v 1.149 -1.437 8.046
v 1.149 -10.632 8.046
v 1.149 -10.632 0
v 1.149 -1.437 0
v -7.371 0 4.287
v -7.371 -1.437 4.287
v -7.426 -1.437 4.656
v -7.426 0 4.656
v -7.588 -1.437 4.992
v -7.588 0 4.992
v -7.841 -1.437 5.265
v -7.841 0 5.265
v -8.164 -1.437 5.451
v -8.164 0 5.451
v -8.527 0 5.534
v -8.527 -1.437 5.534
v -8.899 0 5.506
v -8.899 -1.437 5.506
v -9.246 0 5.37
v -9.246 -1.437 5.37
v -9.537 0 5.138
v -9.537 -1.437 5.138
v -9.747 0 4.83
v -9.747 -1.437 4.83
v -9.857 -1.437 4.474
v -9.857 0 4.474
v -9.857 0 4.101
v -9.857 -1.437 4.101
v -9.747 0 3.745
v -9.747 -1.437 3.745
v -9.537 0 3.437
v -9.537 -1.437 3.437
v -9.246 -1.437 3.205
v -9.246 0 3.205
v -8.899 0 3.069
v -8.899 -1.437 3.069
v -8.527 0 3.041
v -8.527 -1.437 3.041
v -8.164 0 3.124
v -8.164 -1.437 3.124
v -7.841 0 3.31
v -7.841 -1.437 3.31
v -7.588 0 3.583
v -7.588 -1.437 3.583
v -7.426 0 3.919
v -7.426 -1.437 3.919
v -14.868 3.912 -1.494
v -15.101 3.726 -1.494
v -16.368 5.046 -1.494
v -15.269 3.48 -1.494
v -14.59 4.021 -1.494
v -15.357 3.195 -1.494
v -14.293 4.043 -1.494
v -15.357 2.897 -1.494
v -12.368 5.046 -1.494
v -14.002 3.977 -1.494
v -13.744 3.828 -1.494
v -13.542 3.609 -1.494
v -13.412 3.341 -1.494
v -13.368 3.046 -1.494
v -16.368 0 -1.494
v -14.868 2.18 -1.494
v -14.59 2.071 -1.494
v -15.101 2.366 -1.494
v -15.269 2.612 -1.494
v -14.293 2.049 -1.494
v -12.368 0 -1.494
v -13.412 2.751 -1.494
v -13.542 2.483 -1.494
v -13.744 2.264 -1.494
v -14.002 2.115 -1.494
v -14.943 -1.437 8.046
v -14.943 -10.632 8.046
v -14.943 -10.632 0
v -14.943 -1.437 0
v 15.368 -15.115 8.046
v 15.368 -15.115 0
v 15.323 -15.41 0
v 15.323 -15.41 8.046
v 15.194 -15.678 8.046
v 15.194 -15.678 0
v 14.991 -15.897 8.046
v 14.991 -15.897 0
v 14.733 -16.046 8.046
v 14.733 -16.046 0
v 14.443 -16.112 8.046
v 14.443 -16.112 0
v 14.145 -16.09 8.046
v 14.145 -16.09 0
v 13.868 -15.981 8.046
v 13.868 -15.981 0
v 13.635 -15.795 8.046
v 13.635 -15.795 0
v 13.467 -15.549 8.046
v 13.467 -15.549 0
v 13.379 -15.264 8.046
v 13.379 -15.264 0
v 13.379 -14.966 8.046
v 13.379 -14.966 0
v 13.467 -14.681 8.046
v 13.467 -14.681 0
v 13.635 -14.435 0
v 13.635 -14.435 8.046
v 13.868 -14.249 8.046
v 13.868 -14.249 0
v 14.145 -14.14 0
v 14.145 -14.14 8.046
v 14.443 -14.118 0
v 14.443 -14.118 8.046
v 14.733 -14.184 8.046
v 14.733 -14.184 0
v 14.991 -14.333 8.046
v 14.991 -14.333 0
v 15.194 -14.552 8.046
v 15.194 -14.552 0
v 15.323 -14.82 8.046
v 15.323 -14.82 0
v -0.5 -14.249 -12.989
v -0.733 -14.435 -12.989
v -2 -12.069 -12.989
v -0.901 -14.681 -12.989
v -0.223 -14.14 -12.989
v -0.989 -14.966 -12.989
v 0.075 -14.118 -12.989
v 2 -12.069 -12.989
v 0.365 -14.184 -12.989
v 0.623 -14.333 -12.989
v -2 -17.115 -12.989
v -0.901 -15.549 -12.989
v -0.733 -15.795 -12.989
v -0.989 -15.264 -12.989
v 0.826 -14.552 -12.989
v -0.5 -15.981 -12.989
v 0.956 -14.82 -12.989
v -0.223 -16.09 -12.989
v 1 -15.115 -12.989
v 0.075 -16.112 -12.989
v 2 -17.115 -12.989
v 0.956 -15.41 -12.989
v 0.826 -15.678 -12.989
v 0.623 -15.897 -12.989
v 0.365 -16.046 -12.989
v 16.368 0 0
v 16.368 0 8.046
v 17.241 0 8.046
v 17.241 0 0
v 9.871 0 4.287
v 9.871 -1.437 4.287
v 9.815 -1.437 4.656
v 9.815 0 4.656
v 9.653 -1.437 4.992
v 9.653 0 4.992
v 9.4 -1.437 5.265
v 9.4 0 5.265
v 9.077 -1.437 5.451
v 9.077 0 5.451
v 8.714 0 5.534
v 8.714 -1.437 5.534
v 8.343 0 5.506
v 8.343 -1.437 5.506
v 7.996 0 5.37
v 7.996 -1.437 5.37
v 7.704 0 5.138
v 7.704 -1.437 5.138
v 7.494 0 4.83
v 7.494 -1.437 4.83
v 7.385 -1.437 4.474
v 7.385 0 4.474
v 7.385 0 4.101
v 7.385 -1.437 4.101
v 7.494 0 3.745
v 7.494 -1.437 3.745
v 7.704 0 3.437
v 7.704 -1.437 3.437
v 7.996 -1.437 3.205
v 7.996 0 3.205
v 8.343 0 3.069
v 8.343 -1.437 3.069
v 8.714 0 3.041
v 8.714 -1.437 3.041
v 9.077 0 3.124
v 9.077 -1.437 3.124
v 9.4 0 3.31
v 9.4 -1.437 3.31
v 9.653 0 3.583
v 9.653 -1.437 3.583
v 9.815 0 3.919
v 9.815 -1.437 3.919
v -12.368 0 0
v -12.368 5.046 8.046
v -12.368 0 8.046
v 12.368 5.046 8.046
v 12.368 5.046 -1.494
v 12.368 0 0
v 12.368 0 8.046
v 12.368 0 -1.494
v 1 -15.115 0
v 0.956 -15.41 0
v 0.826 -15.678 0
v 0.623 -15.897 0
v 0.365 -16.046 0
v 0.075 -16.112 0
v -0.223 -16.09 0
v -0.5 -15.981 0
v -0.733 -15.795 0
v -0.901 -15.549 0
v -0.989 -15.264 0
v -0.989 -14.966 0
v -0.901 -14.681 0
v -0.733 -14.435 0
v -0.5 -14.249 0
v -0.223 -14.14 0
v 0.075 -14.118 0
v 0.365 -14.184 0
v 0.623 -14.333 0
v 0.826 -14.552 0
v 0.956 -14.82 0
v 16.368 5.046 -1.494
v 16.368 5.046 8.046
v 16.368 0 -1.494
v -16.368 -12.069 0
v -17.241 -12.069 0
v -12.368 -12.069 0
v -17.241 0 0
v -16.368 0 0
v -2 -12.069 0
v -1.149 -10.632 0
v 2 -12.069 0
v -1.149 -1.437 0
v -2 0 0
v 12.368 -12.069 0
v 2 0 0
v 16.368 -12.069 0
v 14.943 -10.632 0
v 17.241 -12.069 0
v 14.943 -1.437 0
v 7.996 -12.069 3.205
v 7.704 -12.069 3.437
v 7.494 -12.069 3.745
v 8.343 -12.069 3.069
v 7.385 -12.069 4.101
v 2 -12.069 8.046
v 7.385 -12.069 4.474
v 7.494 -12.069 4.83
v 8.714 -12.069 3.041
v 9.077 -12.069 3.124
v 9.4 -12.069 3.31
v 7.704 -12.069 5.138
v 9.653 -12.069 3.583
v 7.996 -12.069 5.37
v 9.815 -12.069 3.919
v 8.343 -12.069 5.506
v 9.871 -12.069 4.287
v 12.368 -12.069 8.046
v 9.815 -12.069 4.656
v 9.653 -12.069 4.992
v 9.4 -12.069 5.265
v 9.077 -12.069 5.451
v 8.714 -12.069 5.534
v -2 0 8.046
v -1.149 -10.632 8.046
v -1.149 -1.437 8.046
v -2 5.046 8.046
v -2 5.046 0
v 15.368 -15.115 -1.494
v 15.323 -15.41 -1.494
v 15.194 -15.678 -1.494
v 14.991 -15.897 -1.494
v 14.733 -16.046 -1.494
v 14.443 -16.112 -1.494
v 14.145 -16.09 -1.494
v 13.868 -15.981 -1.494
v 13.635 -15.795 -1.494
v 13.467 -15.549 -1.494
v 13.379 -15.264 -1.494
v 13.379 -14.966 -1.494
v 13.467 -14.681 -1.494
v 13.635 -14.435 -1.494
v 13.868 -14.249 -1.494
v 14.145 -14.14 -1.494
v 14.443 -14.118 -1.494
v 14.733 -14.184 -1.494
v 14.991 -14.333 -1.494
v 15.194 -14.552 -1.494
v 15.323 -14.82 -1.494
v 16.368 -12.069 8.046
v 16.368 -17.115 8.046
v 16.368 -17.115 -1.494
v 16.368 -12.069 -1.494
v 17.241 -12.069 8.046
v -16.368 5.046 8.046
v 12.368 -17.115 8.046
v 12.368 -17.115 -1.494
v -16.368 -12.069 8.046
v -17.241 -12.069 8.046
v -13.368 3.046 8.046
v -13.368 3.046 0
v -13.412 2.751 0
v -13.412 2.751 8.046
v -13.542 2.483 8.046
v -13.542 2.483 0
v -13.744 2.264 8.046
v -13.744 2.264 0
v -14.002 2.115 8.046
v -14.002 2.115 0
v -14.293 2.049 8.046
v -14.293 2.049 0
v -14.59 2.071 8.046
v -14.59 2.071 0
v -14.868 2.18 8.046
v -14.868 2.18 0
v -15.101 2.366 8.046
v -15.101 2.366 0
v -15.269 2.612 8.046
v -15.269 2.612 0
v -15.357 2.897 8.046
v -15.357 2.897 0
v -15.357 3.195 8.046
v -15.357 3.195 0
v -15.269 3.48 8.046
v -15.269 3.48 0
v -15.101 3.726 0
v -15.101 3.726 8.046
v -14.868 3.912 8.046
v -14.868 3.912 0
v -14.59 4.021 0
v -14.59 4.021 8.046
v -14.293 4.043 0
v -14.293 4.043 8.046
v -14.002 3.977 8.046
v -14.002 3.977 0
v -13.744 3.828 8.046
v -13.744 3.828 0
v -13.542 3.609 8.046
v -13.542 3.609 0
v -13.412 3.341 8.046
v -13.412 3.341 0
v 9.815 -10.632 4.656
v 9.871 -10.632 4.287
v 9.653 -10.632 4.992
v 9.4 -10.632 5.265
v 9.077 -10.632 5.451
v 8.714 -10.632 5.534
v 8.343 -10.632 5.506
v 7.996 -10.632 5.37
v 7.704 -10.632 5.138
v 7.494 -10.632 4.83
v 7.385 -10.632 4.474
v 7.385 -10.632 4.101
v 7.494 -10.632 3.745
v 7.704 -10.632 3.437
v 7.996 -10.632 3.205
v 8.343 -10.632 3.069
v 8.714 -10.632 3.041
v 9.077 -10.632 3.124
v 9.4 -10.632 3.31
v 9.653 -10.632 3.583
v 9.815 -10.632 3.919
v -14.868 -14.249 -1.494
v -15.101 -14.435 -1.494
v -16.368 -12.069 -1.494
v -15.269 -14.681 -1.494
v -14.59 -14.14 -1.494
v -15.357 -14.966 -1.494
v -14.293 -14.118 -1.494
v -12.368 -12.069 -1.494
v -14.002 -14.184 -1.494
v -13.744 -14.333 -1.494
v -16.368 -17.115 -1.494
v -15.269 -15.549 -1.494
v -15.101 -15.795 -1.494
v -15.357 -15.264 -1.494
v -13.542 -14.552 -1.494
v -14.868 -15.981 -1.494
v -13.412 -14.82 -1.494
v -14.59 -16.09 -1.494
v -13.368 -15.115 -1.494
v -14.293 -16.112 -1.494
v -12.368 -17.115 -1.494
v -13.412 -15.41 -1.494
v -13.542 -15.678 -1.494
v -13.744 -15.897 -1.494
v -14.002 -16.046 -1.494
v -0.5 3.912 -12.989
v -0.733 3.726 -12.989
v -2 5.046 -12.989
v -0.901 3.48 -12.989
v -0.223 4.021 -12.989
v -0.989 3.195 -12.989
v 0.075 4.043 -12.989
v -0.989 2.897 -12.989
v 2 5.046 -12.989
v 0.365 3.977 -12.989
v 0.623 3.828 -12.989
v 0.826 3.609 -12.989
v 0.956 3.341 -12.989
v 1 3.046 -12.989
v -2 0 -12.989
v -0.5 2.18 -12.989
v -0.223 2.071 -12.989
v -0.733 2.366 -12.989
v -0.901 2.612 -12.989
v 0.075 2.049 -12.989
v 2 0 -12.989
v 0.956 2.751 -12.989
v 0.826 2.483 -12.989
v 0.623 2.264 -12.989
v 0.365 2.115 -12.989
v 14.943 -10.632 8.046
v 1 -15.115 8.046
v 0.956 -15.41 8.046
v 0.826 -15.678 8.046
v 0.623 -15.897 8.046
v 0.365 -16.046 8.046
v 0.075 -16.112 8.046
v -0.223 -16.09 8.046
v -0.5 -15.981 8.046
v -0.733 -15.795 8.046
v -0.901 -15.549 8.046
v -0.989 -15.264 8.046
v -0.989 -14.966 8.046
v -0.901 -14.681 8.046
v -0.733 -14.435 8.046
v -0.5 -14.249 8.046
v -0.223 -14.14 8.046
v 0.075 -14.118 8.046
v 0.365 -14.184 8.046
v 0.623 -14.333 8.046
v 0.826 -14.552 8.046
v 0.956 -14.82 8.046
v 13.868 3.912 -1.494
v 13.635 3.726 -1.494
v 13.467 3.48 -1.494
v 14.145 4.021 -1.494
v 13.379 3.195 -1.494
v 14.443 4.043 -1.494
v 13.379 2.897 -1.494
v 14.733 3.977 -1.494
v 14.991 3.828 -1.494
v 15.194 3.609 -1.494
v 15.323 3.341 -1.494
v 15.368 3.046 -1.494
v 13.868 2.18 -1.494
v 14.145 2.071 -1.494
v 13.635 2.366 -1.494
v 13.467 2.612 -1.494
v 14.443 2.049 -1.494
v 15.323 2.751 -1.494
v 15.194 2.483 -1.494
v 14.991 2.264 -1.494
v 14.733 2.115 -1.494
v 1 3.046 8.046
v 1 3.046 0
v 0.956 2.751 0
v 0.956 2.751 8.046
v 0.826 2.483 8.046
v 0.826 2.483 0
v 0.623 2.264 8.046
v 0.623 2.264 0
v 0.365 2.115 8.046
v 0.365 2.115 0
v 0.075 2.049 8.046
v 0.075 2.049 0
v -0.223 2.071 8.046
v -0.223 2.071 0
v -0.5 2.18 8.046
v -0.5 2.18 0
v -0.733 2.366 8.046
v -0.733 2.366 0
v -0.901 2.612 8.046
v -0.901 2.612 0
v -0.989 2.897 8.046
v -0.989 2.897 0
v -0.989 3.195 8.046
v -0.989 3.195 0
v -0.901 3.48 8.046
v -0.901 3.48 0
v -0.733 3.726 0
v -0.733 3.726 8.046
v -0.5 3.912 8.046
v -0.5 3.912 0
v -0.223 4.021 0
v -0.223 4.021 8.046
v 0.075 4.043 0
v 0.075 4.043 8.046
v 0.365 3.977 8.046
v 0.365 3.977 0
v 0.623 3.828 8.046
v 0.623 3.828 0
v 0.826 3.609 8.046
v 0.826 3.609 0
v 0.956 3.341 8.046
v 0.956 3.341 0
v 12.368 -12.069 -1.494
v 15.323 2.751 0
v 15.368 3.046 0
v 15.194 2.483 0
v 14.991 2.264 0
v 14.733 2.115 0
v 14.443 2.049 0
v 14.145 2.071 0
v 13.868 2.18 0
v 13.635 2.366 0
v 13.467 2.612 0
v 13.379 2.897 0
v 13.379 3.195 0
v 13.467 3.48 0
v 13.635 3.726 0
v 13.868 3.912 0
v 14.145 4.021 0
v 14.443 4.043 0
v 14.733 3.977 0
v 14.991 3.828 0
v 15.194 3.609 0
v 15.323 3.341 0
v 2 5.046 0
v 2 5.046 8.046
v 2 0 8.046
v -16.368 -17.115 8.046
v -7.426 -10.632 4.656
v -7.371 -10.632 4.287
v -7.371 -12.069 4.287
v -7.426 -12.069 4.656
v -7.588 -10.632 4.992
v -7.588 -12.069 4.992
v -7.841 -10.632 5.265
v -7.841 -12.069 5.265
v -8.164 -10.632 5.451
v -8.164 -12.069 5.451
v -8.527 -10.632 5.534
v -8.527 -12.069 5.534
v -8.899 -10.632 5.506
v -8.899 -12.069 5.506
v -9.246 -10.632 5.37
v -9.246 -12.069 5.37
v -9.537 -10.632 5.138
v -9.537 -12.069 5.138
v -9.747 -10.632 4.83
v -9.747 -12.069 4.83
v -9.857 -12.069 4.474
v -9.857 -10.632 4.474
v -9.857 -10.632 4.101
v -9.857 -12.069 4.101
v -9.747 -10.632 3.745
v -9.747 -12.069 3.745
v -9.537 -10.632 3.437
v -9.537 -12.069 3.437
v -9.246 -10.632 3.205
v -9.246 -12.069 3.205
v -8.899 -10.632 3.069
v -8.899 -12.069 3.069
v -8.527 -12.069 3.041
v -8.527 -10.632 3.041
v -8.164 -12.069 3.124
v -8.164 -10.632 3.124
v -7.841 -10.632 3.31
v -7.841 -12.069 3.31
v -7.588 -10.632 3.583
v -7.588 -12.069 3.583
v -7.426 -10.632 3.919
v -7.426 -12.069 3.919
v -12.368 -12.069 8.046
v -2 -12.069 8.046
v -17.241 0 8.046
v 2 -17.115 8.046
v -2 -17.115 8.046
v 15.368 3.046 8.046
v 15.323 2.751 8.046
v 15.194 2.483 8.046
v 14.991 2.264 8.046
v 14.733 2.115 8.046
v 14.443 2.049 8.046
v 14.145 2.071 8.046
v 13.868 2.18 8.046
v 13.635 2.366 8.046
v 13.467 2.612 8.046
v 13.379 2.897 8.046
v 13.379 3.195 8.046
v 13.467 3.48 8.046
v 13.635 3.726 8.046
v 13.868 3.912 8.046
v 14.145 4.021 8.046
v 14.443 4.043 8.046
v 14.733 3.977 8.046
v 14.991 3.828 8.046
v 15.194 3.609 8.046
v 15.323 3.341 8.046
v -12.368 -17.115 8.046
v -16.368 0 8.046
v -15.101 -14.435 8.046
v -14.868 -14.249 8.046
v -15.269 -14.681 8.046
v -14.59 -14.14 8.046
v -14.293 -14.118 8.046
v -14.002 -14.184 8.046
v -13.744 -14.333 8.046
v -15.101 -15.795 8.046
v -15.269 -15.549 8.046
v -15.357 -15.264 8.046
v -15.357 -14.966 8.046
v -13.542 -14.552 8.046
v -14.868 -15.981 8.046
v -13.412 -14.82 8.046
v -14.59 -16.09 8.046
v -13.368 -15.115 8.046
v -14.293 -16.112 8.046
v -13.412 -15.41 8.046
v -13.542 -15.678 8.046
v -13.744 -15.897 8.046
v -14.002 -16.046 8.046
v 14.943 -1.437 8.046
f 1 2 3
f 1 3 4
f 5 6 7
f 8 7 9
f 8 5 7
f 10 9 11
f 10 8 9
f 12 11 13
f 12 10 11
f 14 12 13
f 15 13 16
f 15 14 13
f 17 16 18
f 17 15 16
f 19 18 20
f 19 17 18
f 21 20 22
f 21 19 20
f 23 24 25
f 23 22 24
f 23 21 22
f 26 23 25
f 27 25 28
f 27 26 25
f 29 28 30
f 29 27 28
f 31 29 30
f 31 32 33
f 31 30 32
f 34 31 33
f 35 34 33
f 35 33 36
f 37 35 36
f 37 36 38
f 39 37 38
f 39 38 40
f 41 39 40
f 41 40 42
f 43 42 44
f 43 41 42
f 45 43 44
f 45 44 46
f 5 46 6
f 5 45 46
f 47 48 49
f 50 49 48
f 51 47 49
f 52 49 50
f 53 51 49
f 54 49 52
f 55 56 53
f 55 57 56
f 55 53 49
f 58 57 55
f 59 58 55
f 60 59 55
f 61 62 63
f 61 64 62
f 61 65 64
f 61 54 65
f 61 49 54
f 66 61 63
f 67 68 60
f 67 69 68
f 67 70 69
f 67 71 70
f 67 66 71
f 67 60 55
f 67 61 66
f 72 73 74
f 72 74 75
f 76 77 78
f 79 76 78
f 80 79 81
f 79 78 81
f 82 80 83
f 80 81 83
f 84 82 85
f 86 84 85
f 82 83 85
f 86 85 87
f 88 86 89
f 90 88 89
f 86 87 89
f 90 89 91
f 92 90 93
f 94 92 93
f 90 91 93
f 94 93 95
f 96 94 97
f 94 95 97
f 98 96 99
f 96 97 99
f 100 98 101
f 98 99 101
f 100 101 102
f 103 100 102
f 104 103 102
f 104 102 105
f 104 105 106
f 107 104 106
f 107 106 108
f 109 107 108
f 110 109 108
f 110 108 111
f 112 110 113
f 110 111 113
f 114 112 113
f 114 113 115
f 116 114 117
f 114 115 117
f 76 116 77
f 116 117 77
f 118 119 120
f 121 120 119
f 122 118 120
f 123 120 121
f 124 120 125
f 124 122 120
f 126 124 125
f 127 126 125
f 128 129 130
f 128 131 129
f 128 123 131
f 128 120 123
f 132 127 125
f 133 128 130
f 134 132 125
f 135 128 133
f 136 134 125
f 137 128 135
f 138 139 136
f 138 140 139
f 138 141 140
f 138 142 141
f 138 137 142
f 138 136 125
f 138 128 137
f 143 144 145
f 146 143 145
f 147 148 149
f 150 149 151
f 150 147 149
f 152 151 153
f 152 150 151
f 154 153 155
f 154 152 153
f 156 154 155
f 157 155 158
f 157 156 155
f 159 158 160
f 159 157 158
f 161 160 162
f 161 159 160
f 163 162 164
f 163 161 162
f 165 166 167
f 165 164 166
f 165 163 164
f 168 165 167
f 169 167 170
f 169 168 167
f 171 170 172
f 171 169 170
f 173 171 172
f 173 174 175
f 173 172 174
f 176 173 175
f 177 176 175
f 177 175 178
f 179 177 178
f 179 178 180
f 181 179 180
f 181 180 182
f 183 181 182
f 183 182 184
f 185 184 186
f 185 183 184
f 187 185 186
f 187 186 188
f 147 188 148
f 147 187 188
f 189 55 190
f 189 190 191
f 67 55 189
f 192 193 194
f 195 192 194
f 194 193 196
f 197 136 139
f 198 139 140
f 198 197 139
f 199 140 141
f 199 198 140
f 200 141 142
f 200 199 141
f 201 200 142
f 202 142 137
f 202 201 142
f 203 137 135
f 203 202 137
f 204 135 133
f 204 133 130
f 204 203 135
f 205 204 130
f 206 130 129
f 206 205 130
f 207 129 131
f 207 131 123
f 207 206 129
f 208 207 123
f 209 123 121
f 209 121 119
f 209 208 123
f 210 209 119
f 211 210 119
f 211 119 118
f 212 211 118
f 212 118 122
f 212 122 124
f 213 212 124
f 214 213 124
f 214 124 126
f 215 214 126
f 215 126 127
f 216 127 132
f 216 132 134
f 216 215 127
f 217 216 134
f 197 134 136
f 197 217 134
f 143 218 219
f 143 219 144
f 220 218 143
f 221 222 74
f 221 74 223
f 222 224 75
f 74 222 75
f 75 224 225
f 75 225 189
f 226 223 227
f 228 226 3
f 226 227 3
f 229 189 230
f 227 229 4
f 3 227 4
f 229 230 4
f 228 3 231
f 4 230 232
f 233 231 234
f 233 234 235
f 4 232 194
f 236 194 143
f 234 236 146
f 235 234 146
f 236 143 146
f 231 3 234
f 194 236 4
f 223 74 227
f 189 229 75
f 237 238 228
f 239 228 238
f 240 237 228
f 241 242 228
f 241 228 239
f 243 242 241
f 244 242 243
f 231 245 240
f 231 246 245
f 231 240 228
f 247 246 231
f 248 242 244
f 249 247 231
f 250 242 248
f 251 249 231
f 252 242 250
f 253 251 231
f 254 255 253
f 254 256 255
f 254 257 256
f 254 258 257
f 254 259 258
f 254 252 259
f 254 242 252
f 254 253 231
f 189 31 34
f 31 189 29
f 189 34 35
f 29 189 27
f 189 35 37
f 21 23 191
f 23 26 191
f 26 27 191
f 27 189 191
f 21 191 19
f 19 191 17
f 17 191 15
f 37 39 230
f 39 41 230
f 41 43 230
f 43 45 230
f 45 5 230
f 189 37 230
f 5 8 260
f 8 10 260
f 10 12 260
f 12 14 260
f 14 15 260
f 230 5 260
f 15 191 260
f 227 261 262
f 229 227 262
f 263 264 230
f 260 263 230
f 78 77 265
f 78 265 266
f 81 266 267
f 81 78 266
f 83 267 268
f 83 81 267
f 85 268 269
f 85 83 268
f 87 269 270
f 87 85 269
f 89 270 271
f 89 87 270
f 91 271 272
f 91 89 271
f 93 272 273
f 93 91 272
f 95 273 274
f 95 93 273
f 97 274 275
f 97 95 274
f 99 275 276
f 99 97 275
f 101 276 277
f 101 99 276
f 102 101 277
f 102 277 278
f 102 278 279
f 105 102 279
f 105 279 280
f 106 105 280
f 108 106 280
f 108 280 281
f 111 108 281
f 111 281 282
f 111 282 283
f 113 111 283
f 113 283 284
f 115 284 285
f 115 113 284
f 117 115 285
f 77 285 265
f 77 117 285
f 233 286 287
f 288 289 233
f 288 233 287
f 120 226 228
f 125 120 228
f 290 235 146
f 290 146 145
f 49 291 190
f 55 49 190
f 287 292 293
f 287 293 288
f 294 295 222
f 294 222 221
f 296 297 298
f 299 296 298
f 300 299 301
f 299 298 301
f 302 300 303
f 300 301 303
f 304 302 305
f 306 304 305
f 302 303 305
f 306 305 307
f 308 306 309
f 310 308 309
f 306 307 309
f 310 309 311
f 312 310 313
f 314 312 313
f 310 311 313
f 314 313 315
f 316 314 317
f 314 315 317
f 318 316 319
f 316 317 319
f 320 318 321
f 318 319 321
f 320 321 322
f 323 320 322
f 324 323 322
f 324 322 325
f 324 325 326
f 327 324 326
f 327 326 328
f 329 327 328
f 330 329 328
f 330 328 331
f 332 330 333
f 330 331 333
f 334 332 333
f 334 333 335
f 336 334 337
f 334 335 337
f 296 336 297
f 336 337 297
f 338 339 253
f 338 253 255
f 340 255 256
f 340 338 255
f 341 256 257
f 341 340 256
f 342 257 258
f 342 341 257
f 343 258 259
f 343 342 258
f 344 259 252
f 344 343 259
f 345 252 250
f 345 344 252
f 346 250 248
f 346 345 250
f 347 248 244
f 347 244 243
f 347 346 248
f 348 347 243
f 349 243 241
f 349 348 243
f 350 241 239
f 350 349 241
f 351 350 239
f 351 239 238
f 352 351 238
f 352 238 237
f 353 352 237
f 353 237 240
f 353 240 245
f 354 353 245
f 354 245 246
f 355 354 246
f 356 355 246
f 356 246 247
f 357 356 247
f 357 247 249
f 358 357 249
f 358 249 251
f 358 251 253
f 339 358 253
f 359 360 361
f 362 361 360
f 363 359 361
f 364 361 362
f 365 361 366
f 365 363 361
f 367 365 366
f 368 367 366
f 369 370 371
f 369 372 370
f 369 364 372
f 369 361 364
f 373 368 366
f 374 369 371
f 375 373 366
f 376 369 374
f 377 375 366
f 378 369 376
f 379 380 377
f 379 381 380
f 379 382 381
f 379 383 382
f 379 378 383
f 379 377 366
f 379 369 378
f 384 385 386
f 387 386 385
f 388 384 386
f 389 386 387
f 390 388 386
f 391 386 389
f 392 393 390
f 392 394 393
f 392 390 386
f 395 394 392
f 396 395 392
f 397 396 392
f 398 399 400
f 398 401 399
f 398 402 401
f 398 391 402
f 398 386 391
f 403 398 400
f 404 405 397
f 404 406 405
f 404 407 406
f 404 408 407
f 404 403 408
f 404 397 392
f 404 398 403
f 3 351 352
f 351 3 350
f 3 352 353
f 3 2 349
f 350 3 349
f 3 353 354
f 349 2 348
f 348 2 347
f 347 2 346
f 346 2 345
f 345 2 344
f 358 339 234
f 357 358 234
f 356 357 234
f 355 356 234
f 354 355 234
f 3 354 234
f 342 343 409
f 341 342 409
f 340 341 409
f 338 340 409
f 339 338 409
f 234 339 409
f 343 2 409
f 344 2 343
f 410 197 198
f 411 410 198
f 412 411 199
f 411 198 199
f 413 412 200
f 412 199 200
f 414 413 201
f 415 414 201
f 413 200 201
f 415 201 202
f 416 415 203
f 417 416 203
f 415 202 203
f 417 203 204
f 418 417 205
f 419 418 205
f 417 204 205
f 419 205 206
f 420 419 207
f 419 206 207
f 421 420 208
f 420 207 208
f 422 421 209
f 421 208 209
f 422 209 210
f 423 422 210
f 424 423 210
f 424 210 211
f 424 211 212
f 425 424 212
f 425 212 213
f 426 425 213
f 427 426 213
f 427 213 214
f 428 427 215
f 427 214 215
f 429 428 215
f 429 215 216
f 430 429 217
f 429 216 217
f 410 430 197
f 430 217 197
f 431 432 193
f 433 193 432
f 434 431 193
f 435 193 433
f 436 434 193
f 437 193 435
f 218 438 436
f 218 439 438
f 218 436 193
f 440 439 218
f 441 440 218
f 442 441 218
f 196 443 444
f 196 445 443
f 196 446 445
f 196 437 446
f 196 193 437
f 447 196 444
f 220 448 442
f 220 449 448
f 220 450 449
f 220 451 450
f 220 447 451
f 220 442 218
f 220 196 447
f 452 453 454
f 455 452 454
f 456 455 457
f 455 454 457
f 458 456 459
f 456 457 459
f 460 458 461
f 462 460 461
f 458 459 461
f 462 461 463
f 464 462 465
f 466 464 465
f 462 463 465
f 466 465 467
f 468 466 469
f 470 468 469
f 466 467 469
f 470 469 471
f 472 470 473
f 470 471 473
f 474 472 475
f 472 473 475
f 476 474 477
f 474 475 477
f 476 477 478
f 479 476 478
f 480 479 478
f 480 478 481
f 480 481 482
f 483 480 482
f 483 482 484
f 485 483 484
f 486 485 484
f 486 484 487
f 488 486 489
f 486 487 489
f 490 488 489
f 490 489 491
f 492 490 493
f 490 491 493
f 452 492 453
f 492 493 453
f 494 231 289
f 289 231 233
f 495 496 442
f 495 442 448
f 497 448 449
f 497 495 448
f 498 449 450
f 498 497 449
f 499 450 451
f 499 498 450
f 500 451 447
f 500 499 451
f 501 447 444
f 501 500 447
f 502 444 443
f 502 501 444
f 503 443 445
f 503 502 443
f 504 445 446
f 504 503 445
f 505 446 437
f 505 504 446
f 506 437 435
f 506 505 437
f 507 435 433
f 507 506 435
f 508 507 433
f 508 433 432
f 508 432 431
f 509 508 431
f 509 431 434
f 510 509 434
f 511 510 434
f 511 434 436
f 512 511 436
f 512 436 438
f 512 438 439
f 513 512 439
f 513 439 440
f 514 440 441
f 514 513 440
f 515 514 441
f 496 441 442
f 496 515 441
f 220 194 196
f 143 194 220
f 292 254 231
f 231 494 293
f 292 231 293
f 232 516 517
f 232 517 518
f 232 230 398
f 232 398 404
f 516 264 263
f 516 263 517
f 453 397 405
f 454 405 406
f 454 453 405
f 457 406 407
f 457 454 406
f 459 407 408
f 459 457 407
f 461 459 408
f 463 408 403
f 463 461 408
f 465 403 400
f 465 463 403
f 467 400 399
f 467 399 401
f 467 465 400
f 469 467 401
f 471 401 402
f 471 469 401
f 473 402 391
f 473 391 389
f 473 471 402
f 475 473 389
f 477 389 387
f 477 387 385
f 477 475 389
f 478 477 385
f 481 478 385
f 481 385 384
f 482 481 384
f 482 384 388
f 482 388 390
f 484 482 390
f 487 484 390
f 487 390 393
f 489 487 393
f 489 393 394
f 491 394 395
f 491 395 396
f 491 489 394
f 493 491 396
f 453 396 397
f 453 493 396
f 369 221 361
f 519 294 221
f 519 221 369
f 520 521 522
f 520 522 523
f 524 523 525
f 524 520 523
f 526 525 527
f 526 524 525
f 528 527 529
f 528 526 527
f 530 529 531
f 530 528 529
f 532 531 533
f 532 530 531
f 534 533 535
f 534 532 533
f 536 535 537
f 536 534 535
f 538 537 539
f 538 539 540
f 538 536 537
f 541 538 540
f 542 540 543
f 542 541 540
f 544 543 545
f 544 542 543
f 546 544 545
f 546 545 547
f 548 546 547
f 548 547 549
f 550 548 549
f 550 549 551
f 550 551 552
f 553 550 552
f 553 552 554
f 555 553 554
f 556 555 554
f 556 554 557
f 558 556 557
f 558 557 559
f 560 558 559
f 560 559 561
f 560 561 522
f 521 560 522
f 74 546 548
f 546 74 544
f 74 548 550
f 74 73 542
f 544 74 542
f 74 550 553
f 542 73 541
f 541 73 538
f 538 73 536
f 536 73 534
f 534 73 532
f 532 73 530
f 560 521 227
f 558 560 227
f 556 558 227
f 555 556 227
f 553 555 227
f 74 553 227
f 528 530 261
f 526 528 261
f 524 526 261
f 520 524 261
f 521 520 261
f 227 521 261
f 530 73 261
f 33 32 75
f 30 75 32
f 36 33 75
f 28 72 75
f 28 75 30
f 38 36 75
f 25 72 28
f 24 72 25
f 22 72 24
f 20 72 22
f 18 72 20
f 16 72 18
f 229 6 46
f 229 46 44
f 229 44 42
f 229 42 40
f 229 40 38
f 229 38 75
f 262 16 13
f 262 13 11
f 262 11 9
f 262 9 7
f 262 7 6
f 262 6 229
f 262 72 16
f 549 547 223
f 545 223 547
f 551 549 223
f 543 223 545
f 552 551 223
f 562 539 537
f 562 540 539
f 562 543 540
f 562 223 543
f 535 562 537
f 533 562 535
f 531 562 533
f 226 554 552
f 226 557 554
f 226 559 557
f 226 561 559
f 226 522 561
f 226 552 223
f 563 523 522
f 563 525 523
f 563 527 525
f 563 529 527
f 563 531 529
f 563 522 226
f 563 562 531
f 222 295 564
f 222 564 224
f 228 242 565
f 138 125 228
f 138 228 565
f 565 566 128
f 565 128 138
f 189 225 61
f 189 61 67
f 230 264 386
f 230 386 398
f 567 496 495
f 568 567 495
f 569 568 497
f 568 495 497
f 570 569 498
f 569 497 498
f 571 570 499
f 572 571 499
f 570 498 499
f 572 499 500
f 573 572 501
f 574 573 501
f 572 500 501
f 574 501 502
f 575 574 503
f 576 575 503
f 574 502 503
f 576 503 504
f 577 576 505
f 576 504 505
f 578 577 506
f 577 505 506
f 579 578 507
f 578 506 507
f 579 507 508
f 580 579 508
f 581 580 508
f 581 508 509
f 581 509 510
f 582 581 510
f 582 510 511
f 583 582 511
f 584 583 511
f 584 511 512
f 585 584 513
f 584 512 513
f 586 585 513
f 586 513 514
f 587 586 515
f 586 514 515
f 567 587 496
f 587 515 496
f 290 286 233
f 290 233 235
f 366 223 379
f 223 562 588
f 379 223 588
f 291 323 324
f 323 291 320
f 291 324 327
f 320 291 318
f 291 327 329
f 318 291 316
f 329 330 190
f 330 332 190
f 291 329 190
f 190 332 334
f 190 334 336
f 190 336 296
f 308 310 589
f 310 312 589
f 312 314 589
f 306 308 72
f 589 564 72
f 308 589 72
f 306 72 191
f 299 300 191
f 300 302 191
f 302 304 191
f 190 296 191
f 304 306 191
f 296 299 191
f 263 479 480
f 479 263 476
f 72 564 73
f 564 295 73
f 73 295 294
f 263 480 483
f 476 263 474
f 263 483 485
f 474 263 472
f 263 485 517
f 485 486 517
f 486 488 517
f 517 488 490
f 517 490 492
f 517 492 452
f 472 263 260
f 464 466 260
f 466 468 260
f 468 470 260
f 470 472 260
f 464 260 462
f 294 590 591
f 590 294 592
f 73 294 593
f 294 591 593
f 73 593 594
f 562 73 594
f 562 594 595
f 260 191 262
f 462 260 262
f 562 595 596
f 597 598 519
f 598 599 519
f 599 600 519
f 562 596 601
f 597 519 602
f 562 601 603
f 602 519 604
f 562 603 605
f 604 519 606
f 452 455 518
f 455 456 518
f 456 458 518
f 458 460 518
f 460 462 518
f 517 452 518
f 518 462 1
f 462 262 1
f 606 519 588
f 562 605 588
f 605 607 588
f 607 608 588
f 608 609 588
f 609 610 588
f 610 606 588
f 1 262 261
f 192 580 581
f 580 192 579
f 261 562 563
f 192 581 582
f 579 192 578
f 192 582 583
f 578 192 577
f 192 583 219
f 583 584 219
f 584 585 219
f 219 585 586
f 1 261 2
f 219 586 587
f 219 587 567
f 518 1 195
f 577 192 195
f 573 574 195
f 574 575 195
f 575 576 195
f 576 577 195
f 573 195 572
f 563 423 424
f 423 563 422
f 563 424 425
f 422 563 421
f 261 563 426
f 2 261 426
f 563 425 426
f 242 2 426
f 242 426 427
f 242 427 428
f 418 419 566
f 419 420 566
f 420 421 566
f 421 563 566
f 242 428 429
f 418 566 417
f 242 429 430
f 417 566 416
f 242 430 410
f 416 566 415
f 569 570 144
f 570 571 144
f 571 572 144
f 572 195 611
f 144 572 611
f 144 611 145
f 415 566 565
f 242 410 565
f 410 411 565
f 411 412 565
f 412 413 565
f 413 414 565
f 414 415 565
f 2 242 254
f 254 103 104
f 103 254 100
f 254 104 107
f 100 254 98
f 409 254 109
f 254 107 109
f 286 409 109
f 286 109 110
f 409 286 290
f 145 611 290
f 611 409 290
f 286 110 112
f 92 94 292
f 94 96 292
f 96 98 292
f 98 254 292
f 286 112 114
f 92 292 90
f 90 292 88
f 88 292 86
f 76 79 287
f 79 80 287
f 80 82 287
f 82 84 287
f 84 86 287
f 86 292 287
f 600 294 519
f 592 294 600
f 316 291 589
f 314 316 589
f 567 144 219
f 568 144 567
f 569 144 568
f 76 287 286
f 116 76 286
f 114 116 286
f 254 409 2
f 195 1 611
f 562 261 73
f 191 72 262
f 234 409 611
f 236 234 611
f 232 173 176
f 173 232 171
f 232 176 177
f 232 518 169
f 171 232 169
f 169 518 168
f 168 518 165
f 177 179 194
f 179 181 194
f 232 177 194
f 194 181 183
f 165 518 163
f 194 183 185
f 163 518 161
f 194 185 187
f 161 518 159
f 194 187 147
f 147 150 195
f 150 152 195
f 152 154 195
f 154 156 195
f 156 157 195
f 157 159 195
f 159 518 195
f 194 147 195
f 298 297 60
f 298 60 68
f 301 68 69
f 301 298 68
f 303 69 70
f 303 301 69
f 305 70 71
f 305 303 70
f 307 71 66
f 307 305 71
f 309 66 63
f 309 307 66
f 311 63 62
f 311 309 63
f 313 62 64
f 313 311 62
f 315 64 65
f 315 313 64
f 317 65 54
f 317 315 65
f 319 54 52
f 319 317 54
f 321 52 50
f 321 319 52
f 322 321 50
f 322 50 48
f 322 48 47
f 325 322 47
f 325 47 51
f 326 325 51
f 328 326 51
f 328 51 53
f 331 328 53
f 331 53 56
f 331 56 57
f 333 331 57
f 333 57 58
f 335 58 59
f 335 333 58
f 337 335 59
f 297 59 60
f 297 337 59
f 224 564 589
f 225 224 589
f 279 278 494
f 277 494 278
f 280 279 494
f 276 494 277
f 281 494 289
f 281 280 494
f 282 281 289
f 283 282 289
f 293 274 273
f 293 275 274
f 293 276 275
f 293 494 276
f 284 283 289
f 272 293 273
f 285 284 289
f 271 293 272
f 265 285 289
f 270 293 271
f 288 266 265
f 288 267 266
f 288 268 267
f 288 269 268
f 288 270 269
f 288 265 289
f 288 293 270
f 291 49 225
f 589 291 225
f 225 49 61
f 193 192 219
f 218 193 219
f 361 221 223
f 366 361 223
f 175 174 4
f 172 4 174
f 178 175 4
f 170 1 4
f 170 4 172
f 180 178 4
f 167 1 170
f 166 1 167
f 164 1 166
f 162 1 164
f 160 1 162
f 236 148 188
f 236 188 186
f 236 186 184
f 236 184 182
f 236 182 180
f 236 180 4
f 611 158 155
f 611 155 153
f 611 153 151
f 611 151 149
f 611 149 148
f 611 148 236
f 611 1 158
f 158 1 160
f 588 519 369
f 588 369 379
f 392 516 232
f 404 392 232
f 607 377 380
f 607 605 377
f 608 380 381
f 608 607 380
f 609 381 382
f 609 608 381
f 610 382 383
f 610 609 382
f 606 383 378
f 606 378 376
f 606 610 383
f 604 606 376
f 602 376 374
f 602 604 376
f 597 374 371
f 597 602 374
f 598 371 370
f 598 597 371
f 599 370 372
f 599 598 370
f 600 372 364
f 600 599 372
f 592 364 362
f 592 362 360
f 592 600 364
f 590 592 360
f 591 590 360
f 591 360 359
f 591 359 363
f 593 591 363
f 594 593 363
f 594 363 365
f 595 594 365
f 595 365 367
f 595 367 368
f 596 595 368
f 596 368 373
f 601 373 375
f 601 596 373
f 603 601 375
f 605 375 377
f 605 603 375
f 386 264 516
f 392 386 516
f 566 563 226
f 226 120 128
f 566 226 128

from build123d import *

# Parameters (mm, degrees)
F1_R          = 1.25
F2_DEPTH      = 12.0689655172
F3_W          = 13.7931034483
F3_H          = 9.1954022989
F4_DEPTH      = 8.0469770115
F5_W          = 4
F5_H          = 5.0459770115
F5_R          = 1
F6_DEPTH      = 8.0459770115
F6_DEPTH_BACK = 1.4942528736
F7_W          = 4
F7_H          = 5.0459770115
F7_R          = 1
F8_DEPTH      = 12.9885057471
F8_DEPTH_BACK = 8.0459770115


with BuildPart() as f2:
    # F1 (on Front) → F2 (new body)
    with BuildSketch(Plane.XZ):
        Polygon((-17.2413793103, 0), (0, 0), (17.2413793103, 0), (17.2413793103, 1.724137931), (17.2413793103, 8.0459770115), (0, 8.0459770115), (-17.2413793103, 8.0459770115), (-17.2413793103, 1.724137931), align=None)
        with Locations((-8.6206896552, 4.2873563218)):
            Circle(F1_R, mode=Mode.SUBTRACT)
        with Locations((8.6206896552, 4.2873563218)):
            Circle(F1_R, mode=Mode.SUBTRACT)
    extrude(amount=F2_DEPTH)

    # F3 (on face) → F4 (cut, through all)
    with BuildSketch(Plane.XY.offset(8.0459770115)):
        with Locations((-8.0459770115, -6.0344827586)):
            Rectangle(F3_W, F3_H)
        with Locations((8.0459770115, -6.0344827586)):
            Rectangle(F3_W, F3_H)
    extrude(amount=-F4_DEPTH, mode=Mode.SUBTRACT)

    # F5 (on face) → F6 (join, two sides)
    with BuildSketch(Plane(origin=(0, 0, 0), x_dir=(1, 0, 0), z_dir=(0, 0, -1))) as f6_sk:
        with Locations((-14.367816092, 14.591954023)):
            Rectangle(F5_W, F5_H)
        with Locations((-14.367816092, 15.1149425287)):
            Circle(F5_R, mode=Mode.SUBTRACT)
        with Locations((14.367816092, 14.591954023)):
            Rectangle(F5_W, F5_H)
        with Locations((14.367816092, 15.1149425287)):
            Circle(F5_R, mode=Mode.SUBTRACT)
        with Locations((-14.367816092, -2.5229885057)):
            Rectangle(F5_W, F5_H)
        with Locations((-14.367816092, -3.0459770115)):
            Circle(F5_R, mode=Mode.SUBTRACT)
        with Locations((14.367816092, -2.5229885057)):
            Rectangle(F5_W, F5_H)
        with Locations((14.367816092, -3.0459770115)):
            Circle(F5_R, mode=Mode.SUBTRACT)
    extrude(amount=-F6_DEPTH)
    extrude(f6_sk.sketch, amount=F6_DEPTH_BACK)

    # F7 (on face) → F8 (join, two sides)
    with BuildSketch(Plane(origin=(0, 0, 0), x_dir=(1, 0, 0), z_dir=(0, 0, -1))) as f8_sk:
        with Locations((0, 14.591954023)):
            Rectangle(F7_W, F7_H)
        with Locations((0, 15.1149425287)):
            Circle(F7_R, mode=Mode.SUBTRACT)
        with Locations((0, -2.5229885057)):
            Rectangle(F7_W, F7_H)
        with Locations((0, -3.0459770115)):
            Circle(F7_R, mode=Mode.SUBTRACT)
    extrude(amount=F8_DEPTH)
    extrude(f8_sk.sketch, amount=-F8_DEPTH_BACK)


solid = f2.part
